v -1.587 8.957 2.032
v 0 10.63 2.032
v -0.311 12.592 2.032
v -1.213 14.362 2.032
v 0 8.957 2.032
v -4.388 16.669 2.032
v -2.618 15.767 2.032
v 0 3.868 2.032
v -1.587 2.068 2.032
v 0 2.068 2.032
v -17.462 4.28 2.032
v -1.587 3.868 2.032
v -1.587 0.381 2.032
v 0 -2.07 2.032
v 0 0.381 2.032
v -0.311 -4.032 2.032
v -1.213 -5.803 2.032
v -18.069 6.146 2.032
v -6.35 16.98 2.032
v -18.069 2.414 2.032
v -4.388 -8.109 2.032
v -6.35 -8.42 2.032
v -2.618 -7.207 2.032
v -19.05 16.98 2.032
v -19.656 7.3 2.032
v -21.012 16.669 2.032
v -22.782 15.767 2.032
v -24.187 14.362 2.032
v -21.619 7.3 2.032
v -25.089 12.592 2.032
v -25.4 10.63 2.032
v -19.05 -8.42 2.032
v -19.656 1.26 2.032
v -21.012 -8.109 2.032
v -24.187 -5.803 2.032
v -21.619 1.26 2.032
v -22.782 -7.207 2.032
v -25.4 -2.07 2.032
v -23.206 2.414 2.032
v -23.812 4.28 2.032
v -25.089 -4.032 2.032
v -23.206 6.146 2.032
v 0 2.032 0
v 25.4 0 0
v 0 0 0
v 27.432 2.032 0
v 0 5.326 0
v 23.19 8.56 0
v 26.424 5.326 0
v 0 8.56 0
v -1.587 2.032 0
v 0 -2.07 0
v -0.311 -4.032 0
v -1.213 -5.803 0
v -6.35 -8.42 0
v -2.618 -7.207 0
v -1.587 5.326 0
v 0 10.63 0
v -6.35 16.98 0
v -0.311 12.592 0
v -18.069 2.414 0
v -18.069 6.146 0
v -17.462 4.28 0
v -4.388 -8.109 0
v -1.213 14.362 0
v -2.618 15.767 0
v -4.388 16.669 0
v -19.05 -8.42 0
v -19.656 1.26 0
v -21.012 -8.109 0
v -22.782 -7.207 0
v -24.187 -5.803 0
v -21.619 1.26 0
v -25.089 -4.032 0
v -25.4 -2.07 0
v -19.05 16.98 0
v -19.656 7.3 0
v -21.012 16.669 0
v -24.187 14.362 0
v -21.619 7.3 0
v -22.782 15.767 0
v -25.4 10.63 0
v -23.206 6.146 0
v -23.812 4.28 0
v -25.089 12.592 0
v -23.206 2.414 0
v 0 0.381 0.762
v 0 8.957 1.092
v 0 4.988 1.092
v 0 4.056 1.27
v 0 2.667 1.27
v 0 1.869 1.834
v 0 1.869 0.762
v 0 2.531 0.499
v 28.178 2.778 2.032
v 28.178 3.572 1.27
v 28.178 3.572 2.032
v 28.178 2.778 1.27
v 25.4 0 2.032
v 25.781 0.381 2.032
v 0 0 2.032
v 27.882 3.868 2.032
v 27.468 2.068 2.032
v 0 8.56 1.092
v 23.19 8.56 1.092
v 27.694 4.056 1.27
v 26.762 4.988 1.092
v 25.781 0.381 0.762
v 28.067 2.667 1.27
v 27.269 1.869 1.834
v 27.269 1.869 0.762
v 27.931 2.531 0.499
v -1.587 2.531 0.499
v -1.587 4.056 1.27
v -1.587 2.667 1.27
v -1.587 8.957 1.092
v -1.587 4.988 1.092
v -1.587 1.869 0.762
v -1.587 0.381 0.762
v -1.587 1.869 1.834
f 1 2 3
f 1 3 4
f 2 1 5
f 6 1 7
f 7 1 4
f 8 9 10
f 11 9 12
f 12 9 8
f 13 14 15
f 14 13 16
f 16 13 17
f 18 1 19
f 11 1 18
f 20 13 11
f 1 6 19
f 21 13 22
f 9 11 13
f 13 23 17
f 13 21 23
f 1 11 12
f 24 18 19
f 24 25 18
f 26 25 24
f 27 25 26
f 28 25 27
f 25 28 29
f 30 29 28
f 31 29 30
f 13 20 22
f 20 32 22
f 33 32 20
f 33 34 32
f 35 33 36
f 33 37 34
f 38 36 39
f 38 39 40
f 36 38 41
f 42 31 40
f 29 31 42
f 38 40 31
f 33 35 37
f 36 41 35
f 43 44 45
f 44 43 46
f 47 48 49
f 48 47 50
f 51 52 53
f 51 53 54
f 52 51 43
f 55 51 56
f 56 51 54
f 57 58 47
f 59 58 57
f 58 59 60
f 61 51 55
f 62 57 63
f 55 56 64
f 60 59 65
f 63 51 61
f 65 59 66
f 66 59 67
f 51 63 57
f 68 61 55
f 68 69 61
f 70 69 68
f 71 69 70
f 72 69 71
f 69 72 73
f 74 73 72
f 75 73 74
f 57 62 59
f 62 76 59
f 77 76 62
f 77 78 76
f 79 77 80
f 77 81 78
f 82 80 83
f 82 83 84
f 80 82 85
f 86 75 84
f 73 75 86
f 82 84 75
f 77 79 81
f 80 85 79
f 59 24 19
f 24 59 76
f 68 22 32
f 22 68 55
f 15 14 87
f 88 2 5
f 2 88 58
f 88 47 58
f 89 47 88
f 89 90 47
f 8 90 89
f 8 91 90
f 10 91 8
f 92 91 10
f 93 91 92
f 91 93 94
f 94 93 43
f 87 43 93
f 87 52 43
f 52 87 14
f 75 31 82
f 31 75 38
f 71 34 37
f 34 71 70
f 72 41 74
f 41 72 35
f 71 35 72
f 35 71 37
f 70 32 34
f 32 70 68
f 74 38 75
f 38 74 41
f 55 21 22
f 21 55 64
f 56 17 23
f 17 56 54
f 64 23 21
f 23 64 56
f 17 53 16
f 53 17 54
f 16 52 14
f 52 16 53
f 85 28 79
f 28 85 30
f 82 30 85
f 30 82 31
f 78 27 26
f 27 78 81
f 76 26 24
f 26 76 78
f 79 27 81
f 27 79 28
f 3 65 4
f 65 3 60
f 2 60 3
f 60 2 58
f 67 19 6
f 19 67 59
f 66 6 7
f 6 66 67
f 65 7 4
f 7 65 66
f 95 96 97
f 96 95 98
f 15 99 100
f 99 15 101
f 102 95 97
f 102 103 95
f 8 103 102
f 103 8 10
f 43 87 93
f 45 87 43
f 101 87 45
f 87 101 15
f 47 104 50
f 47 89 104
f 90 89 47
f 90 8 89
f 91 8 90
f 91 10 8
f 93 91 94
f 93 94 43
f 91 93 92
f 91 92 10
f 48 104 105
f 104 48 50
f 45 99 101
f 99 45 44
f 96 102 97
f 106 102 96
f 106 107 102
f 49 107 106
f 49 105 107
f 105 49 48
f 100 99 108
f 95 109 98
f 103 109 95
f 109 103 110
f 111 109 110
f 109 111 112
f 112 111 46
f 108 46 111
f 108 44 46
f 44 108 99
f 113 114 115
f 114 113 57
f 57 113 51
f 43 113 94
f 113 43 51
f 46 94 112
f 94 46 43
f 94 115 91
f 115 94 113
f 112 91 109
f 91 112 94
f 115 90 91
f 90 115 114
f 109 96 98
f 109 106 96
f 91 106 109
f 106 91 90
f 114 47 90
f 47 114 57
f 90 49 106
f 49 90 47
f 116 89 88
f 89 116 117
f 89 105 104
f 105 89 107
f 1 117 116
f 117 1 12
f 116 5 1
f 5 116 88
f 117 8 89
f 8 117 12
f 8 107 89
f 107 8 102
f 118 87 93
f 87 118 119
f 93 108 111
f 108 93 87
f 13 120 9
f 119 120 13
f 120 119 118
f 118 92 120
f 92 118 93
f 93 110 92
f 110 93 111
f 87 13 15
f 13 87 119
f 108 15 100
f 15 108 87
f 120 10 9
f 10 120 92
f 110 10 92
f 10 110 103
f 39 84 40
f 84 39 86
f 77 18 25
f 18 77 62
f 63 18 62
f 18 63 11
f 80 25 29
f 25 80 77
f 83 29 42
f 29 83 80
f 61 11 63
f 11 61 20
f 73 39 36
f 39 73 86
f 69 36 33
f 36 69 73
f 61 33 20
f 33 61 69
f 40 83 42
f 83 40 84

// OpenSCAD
// Physical Keygen - by Nirav Patel <http://eclecti.cc>
//
// Generate a duplicate of a Kwikset KW1 key by editing the last line of the file
// and entering in the key code of the lock.  If you don't know the key code,
// you can measure the key and compare the numbers at:
// http://web.archive.org/web/20050217020917fw_/http://dlaco.com/spacing/tips.htm
//
// This work is licensed under a Creative Commons Attribution 3.0 Unported License.

// Since the keys and locks I have were all designed in imperial units, the
// constants in this file will be defined in inches.  The mm function
// allows us to retain the proper size for exporting a metric STL.


// *** modifications were implemented to accept key cut codes as parameters ***
// changes enable use with 3DKeys - mod's and 3DKeys implemented by Ed Sellers
// key code parameters and a code designation for generating:
//   a key blank - no cuts
//   a bump key  - all deep cuts
//   a code key  - use the cuts supplied to cut the key
// 


function mm(i) = i*25.4;

module rounded(size, r) {
    union() {
        translate([r, 0, 0]) cube([size[0]-2*r, size[1], size[2]]);
        translate([0, r, 0]) cube([size[0], size[1]-2*r, size[2]]);
        translate([r, r, 0]) cylinder(h=size[2], r=r);
        translate([size[0]-r, r, 0]) cylinder(h=size[2], r=r);
        translate([r, size[1]-r, 0]) cylinder(h=size[2], r=r);
        translate([size[0]-r, size[1]-r, 0]) cylinder(h=size[2], r=r);
    }
}

module bit(bitw) {
//bitw was 128
    w = mm(1/4);
    difference() {
        translate([-w/2, 0, 0]) cube([w, mm(1), w]);
        translate([-mm(5/bitw), 0, 0]) rotate([0, 0, 135]) cube([w, w, w]);
        translate([mm(5/bitw), 0, 0]) rotate([0, 0, -45]) cube([w, w, w]);
    }
}

// Kwikset KW1 5 pin key.  The measurements are mostly guesses based on reverse
// engineering some keys I have and some publicly available information.
module KW1(switch,bits) {

    usebitting = (switch == "code");
    makebump = (switch == "bump");


    // You may need to adjust these to fit your specific printer settings
    thickness = mm(0.080);
    length = mm(9/8);
    width = mm(.337);
    
    shoulder = mm(.247);
    pin_spacing = mm(.15);
    depth_inc = mm(.023);
    
    // A fudge factor.  Printing with your average RepRap, the bottom layer is
    // going to be squeezed larger than you want. You can make the pins
    // go slighly deeper by a fudge amount to make up for it if you aren't
    // adjusting for it elsewhere like Skeinforge or in your firmware.
    fudge = 0.5;
    
    // Handle size
    h_l = mm(1);
    h_w = mm(1);
    h_d = mm(1/16);
    difference() {
        // blade and key handle
        union() {
            translate([-h_l, -h_w/2 + width/2, 0]) rounded([h_l, h_w, thickness], mm(1/4));
            // cut a little off the tip to avoid going too long
            cube([length - mm(1/64), width, thickness]);
        }
        
        // chamfer the tip
        translate([length, mm(1/8), 0]) {
            rotate([0, 0, 45]) cube([10, 10, thickness]);
            rotate([0, 0, 225]) cube([10, 10, thickness]);
        }
        
        // put in a hole for keychain use
        translate([-h_l + mm(3/16), width/2, 0]) cylinder(h=thickness, r=mm(1/8));
        
        // cut the channels in the key.  designed more for printability than accuracy
        union() {
            translate([-h_d, mm(.105), mm(.025)]) rotate([225, 0, 0]) cube([length + h_d, width, width]);
            translate([-h_d, mm(.105), mm(.05)]) rotate([260, 0, 0]) cube([length + h_d, thickness/2, mm(1/32)]);
            translate([-h_d, mm(.105), 0]) cube([length + h_d, mm(7/128), mm(.05)]);
            translate([-h_d, mm(.105) + mm(7/128), mm(.05)]) rotate([225, 0, 0]) cube([length + h_d, mm(3/64), thickness]);
        }
        
        translate([-h_d, width - mm(9/64), mm(.043)]) {
            cube([length + h_d, width - (width - mm(10/64)), thickness]);
            rotate([50, 0, 0]) cube([length + h_d, width, thickness]);
        }
        
        union() {
            translate([-h_d, mm(0.015), mm(.03)]) cube([length + h_d, mm(15/256), thickness]);
            translate([-h_d, mm(0.015) + mm(13/256), thickness - mm(1/64)]) rotate([45, 0, 0]) cube([length + h_d, mm(1/16), mm(1/16)]);
        }

        // Do the actual bitting
       if (usebitting) {
           for (b = [0:4]) {
                // KW1 doesn't have a 0 value and instead has 1 start around .008" deep
                translate([shoulder + fudge + b*pin_spacing, width - mm(.008) - (bits[b] - 1)*depth_inc - fudge, 0]) bit(128);
           }
       }
	  if (makebump) {
           //for (b = [0:5]) {
                // KW1 doesn't have a 0 value and instead has 1 start around .008" deep
                translate([shoulder + fudge + 0*pin_spacing, width - mm(.008) - (bits[0] - 1)*depth_inc - fudge, 0]) bit(512);
                translate([shoulder + fudge + 1*pin_spacing, width - mm(.008) - (bits[1] - 1)*depth_inc - fudge, 0]) bit(512);
                translate([shoulder + fudge + 2*pin_spacing, width - mm(.008) - (bits[2] - 1)*depth_inc - fudge, 0]) bit(512);
                translate([shoulder + fudge + 3*pin_spacing, width - mm(.008) - (bits[3] - 1)*depth_inc - fudge, 0]) bit(512);
                translate([shoulder + fudge + 4*pin_spacing, width - mm(.008) - (bits[4] - 1)*depth_inc - fudge, 0]) bit(512);
                translate([shoulder + fudge + 5*pin_spacing, width - mm(.008) - (bits[4] - 1)*depth_inc - fudge, 0]) bit(512);
           //}
       }

    }
}


KW1("blank",[7,7,7,7,7,7]);
